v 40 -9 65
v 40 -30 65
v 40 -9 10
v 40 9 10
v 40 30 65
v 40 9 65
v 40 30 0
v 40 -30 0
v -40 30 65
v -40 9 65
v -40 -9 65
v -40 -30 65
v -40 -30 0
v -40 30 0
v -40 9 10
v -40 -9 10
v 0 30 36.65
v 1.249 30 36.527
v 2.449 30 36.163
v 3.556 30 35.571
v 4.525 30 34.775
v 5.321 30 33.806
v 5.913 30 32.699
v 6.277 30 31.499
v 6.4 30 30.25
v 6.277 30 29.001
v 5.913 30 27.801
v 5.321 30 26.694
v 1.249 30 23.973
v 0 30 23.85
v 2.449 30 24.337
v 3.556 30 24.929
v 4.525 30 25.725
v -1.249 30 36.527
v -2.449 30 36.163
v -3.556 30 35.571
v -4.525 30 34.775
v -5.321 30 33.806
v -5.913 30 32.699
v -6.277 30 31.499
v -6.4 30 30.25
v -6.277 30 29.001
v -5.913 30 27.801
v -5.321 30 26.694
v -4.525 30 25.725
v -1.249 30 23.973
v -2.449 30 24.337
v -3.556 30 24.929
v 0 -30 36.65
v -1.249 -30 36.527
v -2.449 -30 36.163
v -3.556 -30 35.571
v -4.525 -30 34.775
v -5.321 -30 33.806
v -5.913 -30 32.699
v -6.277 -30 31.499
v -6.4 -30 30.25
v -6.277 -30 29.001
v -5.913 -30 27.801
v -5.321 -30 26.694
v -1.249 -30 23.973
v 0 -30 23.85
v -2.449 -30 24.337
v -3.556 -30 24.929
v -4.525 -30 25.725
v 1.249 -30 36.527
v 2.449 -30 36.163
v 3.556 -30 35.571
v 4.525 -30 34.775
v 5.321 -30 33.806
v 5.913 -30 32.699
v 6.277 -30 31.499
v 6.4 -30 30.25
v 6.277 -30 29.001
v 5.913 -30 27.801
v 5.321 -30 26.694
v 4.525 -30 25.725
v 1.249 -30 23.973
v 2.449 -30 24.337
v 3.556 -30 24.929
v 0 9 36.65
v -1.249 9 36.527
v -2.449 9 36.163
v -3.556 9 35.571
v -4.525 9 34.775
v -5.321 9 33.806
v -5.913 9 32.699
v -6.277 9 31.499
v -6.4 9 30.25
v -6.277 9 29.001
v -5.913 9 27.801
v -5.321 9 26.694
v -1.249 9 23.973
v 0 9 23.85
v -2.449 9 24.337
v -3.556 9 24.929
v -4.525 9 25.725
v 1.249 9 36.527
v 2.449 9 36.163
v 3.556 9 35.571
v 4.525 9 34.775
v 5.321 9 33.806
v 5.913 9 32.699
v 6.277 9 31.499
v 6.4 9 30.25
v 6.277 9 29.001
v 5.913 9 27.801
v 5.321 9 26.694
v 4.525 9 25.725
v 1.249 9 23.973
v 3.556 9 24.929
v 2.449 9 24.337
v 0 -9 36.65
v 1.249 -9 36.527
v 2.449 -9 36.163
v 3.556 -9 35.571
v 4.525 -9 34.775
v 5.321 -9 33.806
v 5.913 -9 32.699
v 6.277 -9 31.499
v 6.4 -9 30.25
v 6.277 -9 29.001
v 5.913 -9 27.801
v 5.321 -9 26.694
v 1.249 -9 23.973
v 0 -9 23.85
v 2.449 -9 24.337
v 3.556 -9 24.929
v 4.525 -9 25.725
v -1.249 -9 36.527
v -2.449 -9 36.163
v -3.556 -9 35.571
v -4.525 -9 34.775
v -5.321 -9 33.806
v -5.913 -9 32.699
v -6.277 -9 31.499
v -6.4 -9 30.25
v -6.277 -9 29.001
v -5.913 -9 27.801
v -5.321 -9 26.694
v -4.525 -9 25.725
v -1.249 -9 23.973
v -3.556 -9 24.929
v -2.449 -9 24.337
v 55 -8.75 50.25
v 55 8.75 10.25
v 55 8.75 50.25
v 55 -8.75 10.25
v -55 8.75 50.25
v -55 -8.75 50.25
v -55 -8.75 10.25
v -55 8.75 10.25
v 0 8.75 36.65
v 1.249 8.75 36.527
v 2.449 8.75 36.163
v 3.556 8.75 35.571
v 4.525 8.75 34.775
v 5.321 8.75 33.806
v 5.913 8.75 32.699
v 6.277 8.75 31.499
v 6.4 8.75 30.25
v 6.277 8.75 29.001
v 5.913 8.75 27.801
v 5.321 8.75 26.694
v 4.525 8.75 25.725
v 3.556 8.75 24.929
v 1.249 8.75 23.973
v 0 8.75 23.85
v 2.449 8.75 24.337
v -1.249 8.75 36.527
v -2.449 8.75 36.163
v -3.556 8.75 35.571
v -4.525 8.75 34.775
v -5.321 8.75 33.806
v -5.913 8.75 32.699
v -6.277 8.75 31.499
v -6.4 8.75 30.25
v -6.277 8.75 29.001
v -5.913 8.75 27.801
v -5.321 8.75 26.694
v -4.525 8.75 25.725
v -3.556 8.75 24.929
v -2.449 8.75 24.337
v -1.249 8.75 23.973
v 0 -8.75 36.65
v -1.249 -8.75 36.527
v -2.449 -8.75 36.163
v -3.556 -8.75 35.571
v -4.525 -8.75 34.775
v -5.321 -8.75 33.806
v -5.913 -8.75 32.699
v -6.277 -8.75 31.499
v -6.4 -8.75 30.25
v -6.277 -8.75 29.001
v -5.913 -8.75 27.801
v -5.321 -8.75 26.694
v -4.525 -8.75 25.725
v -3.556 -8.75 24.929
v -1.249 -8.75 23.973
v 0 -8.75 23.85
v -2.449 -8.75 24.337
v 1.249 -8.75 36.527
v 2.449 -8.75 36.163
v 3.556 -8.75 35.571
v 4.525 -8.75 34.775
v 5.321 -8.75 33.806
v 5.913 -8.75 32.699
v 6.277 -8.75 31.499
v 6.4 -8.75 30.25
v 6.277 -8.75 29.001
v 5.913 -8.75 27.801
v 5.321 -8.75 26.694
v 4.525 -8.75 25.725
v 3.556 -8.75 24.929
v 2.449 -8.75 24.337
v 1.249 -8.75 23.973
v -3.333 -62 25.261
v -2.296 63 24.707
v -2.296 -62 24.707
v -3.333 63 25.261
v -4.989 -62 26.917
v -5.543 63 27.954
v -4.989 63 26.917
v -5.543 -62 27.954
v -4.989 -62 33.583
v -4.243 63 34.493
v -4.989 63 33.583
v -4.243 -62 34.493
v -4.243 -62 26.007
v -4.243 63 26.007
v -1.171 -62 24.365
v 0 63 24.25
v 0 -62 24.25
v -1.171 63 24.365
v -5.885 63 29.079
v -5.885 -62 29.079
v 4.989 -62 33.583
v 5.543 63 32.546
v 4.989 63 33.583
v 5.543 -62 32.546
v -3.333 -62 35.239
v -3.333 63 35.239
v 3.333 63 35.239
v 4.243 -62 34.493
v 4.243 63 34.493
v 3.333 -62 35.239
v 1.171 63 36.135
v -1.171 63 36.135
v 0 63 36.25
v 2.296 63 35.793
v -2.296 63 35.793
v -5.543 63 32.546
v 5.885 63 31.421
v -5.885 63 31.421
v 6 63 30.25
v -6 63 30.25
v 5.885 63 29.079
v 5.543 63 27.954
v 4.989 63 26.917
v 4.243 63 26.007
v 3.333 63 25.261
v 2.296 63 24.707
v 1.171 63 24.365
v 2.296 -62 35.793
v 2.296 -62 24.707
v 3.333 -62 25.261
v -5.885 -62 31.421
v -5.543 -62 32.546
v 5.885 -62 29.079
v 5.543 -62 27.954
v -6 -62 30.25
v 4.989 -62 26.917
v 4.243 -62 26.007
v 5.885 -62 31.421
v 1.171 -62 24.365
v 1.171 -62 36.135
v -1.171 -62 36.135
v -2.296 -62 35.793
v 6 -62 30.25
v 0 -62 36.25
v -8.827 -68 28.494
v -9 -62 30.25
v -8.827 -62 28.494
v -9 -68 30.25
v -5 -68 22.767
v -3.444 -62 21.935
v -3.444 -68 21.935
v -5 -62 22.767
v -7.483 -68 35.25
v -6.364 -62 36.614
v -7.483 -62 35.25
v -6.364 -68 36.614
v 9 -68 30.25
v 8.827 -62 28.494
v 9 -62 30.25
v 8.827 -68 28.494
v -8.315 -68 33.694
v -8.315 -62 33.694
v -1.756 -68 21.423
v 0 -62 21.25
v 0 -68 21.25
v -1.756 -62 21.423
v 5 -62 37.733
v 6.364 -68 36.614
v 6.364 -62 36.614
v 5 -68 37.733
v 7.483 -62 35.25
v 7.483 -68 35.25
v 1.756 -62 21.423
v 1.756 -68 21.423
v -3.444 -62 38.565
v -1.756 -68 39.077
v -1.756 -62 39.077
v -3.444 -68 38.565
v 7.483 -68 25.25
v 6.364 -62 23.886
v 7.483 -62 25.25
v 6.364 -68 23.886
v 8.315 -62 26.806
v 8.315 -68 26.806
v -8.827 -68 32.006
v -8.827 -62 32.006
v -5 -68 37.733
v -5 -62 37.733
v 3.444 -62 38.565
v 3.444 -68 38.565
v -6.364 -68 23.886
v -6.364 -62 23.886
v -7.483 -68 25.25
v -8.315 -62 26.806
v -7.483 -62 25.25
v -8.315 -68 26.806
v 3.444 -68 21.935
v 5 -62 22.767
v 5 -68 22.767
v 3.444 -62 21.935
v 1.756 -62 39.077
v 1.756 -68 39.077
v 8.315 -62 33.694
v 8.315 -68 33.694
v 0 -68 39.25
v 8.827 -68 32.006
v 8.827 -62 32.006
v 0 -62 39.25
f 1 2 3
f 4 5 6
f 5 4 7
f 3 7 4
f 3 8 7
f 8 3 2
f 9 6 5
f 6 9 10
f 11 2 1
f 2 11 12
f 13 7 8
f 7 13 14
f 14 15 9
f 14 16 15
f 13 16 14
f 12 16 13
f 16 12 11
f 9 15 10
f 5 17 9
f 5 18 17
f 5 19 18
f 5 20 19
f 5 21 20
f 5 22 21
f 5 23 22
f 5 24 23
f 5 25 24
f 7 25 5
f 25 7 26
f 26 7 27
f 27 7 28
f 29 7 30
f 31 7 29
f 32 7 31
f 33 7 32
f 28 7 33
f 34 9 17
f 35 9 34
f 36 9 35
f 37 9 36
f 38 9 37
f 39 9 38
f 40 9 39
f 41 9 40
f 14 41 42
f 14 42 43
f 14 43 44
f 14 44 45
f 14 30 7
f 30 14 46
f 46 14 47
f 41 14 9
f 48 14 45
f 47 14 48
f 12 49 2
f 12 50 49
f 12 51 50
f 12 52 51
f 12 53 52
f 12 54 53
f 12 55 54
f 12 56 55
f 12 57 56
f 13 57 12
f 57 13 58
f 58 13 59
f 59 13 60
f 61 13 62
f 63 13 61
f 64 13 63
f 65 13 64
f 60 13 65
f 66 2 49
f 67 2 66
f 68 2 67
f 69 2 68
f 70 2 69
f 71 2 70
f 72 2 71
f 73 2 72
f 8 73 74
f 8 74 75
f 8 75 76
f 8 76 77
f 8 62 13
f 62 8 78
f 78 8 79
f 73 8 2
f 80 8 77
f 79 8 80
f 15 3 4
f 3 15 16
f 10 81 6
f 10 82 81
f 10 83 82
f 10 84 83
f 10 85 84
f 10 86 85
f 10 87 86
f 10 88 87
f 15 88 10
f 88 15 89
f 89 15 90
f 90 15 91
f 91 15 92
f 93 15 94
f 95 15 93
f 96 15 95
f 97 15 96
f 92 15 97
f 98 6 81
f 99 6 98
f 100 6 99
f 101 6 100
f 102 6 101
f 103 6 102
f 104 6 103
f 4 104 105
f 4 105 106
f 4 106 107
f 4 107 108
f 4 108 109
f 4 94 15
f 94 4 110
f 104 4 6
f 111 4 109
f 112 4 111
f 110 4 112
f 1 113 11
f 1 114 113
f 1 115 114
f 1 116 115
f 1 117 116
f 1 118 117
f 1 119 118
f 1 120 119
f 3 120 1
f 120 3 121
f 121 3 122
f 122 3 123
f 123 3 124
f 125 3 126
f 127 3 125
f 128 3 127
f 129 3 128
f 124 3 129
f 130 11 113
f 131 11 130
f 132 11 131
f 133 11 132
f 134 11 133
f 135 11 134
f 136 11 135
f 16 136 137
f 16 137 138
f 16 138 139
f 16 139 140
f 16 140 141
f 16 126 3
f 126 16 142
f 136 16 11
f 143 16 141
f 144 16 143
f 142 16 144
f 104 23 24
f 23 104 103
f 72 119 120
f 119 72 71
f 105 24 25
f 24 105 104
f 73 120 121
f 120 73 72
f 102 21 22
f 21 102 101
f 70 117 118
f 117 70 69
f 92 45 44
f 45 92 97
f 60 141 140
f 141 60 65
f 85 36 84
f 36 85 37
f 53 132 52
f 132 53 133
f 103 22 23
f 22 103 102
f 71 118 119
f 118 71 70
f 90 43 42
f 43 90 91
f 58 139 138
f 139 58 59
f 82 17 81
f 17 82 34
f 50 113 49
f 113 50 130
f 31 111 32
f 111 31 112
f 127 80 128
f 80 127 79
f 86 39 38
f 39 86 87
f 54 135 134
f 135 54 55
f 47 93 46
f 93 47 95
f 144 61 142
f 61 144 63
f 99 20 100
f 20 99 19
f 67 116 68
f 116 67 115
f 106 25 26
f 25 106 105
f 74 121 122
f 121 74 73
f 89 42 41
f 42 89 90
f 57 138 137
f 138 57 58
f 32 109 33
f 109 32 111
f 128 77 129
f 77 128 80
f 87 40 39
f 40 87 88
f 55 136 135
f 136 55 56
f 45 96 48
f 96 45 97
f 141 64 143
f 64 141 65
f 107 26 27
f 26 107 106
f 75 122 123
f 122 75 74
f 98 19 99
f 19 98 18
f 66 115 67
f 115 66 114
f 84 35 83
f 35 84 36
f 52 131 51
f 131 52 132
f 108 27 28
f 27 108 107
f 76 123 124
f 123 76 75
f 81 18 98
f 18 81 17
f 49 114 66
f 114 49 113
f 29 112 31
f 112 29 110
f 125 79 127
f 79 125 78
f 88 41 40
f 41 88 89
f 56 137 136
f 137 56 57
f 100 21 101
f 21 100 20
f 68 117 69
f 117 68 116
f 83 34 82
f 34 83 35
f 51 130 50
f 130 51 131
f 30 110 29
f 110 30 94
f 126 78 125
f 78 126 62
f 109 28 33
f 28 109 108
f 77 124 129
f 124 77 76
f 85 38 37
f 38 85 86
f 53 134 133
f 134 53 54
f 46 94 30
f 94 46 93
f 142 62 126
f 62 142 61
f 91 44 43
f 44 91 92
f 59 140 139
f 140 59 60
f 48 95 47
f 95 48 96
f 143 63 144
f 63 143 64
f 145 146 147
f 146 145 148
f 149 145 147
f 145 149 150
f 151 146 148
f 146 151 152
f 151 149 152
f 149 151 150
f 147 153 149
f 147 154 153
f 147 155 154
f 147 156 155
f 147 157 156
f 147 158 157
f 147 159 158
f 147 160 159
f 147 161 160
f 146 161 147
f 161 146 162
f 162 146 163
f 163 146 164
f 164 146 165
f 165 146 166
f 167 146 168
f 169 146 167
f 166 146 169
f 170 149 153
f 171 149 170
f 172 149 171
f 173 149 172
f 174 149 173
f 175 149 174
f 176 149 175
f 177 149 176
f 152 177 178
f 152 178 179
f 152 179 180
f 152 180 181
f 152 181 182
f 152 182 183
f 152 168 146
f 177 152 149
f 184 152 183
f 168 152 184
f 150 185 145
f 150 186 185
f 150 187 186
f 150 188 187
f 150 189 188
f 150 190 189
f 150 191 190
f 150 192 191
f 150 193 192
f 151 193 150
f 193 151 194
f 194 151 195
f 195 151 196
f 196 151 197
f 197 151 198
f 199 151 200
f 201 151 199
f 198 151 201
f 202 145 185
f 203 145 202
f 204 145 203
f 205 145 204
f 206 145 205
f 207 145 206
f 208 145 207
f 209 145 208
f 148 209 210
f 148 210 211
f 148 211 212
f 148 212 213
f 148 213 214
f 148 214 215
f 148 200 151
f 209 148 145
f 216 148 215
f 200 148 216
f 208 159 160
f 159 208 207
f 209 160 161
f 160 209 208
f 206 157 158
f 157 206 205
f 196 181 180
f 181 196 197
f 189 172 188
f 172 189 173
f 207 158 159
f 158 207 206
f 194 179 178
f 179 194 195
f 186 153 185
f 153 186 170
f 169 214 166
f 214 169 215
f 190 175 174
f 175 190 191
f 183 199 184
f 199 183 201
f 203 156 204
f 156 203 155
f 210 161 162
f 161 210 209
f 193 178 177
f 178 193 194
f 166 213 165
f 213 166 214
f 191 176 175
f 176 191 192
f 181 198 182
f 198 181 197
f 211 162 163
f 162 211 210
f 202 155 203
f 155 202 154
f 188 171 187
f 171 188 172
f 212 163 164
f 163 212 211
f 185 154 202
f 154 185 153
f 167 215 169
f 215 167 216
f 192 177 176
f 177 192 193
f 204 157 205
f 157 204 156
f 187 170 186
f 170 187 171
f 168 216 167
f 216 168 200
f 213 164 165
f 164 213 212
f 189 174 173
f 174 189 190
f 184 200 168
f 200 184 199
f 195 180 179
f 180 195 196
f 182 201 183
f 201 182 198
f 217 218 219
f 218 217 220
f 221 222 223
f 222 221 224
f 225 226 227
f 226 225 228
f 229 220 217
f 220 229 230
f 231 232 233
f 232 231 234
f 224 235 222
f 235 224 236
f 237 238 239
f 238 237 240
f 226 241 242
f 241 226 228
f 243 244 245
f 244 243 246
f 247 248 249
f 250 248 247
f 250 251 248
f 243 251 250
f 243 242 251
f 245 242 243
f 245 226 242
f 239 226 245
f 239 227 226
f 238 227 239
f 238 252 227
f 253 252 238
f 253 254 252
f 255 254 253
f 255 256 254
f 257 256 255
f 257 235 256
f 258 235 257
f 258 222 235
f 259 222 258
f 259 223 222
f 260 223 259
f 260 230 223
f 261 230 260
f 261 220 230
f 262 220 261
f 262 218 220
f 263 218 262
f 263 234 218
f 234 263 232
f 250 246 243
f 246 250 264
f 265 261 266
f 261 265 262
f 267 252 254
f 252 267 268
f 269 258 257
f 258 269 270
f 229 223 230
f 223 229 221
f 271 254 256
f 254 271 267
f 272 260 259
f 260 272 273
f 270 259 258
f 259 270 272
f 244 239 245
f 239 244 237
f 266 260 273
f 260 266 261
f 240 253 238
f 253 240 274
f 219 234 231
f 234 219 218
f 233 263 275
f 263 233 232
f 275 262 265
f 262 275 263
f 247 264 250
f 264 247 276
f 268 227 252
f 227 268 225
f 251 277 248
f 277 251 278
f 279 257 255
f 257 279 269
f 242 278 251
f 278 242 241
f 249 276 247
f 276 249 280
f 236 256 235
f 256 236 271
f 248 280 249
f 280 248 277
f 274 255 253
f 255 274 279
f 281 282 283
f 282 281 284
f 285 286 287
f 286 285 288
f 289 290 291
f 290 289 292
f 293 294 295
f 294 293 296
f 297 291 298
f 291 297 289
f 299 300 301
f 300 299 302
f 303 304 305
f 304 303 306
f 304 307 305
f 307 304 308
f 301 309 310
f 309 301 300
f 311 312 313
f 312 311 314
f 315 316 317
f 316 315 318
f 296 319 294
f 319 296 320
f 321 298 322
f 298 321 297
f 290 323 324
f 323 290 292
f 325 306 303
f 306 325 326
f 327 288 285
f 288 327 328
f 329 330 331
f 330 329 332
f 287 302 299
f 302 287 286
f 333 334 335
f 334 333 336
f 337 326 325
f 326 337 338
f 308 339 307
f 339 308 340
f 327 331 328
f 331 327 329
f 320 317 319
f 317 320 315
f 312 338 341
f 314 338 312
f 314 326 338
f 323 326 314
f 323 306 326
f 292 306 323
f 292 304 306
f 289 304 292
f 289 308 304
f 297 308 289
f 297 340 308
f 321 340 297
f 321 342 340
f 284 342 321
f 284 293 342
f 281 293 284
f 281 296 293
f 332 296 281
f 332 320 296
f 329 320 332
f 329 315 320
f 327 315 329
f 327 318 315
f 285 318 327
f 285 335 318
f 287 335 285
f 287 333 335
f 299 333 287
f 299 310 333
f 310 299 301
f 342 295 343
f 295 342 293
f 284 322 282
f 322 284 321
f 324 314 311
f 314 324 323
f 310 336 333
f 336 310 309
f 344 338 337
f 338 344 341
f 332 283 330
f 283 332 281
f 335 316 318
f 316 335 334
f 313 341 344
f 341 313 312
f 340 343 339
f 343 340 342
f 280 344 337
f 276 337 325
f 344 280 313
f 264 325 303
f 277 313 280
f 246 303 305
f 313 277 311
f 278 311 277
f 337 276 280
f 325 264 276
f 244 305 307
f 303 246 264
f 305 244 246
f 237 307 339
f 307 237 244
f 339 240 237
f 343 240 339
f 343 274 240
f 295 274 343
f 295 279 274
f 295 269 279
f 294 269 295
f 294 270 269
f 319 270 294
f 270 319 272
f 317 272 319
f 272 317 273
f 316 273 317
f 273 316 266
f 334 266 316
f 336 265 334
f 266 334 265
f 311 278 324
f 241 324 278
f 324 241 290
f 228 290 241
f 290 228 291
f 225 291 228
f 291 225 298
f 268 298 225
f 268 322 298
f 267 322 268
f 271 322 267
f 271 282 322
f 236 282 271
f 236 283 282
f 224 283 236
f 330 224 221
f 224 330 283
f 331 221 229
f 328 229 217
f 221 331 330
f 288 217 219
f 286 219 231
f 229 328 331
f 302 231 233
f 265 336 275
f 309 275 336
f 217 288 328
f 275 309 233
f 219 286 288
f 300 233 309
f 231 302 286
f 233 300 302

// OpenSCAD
$fn = 32;

// ------------------------------------------------------------------------
// Clevis joint: 80 mm clevis, pin d12
// Every part is its own module, assembly() places them once.
// ------------------------------------------------------------------------

// --- part 1 ---
module clevis() {
  difference() {
    translate([-40, -30, 0]) cube([80, 60, 65]);
    translate([-41, -9, 10]) cube([82, 18, 56]);
    translate([0, 0, 30.25]) rotate([90, 0, 0]) cylinder(h = 62, d = 12.8, center = true);
  }
}

// --- part 2 ---
module eye() {
  difference() {
    translate([-55, -8.75, 0]) cube([110, 17.5, 40]);
    translate([0, 0, 20]) rotate([90, 0, 0]) cylinder(h = 19.5, d = 12.8, center = true);
  }
}

// --- part 3 ---
module pin() {
  rotate([0, 90, 0]) cylinder(h = 126, d = 12, center = true);
  translate([-68, 0, 0]) rotate([0, 90, 0]) cylinder(h = 6, d = 18);
}

// --- assembly ---
module assembly() {
  translate([0, 0, 0]) rotate([0, 0, 0]) clevis();
  translate([0, 0, 10.25]) rotate([0, 0, 0]) eye();
  translate([0, 0, 30.25]) rotate([0, 0, 90]) pin();
}

assembly();
